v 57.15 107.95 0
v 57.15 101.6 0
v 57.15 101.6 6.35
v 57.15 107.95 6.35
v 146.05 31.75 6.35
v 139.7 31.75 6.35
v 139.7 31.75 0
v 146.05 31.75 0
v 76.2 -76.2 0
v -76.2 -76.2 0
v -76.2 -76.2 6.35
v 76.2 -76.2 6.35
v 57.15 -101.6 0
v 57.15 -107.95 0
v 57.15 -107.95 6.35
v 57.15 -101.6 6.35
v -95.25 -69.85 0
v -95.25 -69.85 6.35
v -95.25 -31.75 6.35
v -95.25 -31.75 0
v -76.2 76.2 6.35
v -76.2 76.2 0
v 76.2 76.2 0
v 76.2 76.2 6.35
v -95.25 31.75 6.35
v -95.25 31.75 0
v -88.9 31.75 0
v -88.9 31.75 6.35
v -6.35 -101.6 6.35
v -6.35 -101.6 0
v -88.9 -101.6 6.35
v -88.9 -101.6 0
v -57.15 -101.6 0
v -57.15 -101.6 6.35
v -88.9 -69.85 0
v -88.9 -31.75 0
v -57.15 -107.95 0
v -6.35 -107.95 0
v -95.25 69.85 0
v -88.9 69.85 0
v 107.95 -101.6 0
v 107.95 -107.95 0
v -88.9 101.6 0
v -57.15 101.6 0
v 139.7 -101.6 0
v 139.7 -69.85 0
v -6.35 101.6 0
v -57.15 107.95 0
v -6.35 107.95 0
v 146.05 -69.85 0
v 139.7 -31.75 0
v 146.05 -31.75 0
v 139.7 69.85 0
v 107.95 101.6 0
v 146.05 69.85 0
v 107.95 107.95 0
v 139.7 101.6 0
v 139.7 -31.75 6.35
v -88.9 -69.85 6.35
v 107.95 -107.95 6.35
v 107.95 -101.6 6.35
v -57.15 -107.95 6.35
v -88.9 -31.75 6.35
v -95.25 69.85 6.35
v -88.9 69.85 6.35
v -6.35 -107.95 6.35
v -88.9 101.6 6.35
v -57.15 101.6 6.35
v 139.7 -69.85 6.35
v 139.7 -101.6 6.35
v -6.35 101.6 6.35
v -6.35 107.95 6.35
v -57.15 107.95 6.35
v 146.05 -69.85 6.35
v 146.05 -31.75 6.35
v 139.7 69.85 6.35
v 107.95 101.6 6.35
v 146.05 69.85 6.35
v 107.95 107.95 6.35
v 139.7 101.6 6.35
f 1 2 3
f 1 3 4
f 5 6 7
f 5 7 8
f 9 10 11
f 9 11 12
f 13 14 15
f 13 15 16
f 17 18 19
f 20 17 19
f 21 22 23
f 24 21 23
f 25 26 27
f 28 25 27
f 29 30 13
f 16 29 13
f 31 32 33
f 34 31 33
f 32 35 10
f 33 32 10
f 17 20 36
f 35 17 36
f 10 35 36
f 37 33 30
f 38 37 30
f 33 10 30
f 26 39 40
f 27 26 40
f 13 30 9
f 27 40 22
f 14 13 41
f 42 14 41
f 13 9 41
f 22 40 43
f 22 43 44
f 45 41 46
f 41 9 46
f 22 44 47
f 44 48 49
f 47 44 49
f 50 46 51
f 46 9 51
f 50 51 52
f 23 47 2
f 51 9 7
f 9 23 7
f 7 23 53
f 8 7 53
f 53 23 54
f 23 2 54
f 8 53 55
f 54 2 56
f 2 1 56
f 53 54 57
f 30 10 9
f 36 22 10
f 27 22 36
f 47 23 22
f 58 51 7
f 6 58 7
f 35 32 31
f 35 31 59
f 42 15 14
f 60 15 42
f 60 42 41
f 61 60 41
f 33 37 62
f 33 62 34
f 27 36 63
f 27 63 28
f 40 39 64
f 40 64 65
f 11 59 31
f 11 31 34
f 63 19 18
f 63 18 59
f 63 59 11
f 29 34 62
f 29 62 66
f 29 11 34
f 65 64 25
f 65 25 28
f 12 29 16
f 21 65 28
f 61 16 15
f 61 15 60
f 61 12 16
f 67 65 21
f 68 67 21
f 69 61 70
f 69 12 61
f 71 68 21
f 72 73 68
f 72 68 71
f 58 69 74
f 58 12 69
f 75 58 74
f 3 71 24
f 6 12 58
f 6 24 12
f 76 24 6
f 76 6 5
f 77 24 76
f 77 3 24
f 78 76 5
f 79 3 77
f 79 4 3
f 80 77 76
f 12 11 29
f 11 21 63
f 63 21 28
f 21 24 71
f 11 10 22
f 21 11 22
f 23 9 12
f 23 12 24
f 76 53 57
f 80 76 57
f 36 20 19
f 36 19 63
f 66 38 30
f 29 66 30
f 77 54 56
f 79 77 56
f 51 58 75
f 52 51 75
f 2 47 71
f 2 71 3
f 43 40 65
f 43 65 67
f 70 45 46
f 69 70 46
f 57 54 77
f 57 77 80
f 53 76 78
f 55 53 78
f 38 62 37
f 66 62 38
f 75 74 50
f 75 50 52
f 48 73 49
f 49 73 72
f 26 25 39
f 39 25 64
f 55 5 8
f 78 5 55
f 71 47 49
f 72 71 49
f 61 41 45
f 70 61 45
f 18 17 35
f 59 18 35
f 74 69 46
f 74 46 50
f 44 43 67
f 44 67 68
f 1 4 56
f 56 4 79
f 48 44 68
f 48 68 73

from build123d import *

# Parameters (mm, degrees)
F0_W     = 228.6
F0_H     = 203.2
F0_W_2   = 152.4
F0_H_2   = 152.4
F1_DEPTH = 6.35
F2_W     = 50.8
F2_H     = 6.35
F2_W_2   = 6.35
F2_H_2   = 38.1
F3_DEPTH = 6.35


with BuildPart() as f1:
    # F0 (on Top) → F1 (new body)
    with BuildSketch(Plane.XY):
        with Locations((25.4, 0)):
            Rectangle(F0_W, F0_H)
        Rectangle(F0_W_2, F0_H_2, mode=Mode.SUBTRACT)
    extrude(amount=F1_DEPTH)

    # F2 (on face) → F3 (join)
    with BuildSketch(Plane.XY.offset(6.35)):
        with Locations((-31.75, 104.775)):
            Rectangle(F2_W, F2_H)
        with Locations((82.55, 104.775)):
            Rectangle(F2_W, F2_H)
        with Locations((142.875, 50.8)):
            Rectangle(F2_W_2, F2_H_2)
        with Locations((142.875, -50.8)):
            Rectangle(F2_W_2, F2_H_2)
        with Locations((-92.075, -50.8)):
            Rectangle(F2_W_2, F2_H_2)
        with Locations((-92.075, 50.8)):
            Rectangle(F2_W_2, F2_H_2)
        with Locations((82.55, -104.775)):
            Rectangle(F2_W, F2_H)
        with Locations((-31.75, -104.775)):
            Rectangle(F2_W, F2_H)
    extrude(amount=-F3_DEPTH)


solid = f1.part
